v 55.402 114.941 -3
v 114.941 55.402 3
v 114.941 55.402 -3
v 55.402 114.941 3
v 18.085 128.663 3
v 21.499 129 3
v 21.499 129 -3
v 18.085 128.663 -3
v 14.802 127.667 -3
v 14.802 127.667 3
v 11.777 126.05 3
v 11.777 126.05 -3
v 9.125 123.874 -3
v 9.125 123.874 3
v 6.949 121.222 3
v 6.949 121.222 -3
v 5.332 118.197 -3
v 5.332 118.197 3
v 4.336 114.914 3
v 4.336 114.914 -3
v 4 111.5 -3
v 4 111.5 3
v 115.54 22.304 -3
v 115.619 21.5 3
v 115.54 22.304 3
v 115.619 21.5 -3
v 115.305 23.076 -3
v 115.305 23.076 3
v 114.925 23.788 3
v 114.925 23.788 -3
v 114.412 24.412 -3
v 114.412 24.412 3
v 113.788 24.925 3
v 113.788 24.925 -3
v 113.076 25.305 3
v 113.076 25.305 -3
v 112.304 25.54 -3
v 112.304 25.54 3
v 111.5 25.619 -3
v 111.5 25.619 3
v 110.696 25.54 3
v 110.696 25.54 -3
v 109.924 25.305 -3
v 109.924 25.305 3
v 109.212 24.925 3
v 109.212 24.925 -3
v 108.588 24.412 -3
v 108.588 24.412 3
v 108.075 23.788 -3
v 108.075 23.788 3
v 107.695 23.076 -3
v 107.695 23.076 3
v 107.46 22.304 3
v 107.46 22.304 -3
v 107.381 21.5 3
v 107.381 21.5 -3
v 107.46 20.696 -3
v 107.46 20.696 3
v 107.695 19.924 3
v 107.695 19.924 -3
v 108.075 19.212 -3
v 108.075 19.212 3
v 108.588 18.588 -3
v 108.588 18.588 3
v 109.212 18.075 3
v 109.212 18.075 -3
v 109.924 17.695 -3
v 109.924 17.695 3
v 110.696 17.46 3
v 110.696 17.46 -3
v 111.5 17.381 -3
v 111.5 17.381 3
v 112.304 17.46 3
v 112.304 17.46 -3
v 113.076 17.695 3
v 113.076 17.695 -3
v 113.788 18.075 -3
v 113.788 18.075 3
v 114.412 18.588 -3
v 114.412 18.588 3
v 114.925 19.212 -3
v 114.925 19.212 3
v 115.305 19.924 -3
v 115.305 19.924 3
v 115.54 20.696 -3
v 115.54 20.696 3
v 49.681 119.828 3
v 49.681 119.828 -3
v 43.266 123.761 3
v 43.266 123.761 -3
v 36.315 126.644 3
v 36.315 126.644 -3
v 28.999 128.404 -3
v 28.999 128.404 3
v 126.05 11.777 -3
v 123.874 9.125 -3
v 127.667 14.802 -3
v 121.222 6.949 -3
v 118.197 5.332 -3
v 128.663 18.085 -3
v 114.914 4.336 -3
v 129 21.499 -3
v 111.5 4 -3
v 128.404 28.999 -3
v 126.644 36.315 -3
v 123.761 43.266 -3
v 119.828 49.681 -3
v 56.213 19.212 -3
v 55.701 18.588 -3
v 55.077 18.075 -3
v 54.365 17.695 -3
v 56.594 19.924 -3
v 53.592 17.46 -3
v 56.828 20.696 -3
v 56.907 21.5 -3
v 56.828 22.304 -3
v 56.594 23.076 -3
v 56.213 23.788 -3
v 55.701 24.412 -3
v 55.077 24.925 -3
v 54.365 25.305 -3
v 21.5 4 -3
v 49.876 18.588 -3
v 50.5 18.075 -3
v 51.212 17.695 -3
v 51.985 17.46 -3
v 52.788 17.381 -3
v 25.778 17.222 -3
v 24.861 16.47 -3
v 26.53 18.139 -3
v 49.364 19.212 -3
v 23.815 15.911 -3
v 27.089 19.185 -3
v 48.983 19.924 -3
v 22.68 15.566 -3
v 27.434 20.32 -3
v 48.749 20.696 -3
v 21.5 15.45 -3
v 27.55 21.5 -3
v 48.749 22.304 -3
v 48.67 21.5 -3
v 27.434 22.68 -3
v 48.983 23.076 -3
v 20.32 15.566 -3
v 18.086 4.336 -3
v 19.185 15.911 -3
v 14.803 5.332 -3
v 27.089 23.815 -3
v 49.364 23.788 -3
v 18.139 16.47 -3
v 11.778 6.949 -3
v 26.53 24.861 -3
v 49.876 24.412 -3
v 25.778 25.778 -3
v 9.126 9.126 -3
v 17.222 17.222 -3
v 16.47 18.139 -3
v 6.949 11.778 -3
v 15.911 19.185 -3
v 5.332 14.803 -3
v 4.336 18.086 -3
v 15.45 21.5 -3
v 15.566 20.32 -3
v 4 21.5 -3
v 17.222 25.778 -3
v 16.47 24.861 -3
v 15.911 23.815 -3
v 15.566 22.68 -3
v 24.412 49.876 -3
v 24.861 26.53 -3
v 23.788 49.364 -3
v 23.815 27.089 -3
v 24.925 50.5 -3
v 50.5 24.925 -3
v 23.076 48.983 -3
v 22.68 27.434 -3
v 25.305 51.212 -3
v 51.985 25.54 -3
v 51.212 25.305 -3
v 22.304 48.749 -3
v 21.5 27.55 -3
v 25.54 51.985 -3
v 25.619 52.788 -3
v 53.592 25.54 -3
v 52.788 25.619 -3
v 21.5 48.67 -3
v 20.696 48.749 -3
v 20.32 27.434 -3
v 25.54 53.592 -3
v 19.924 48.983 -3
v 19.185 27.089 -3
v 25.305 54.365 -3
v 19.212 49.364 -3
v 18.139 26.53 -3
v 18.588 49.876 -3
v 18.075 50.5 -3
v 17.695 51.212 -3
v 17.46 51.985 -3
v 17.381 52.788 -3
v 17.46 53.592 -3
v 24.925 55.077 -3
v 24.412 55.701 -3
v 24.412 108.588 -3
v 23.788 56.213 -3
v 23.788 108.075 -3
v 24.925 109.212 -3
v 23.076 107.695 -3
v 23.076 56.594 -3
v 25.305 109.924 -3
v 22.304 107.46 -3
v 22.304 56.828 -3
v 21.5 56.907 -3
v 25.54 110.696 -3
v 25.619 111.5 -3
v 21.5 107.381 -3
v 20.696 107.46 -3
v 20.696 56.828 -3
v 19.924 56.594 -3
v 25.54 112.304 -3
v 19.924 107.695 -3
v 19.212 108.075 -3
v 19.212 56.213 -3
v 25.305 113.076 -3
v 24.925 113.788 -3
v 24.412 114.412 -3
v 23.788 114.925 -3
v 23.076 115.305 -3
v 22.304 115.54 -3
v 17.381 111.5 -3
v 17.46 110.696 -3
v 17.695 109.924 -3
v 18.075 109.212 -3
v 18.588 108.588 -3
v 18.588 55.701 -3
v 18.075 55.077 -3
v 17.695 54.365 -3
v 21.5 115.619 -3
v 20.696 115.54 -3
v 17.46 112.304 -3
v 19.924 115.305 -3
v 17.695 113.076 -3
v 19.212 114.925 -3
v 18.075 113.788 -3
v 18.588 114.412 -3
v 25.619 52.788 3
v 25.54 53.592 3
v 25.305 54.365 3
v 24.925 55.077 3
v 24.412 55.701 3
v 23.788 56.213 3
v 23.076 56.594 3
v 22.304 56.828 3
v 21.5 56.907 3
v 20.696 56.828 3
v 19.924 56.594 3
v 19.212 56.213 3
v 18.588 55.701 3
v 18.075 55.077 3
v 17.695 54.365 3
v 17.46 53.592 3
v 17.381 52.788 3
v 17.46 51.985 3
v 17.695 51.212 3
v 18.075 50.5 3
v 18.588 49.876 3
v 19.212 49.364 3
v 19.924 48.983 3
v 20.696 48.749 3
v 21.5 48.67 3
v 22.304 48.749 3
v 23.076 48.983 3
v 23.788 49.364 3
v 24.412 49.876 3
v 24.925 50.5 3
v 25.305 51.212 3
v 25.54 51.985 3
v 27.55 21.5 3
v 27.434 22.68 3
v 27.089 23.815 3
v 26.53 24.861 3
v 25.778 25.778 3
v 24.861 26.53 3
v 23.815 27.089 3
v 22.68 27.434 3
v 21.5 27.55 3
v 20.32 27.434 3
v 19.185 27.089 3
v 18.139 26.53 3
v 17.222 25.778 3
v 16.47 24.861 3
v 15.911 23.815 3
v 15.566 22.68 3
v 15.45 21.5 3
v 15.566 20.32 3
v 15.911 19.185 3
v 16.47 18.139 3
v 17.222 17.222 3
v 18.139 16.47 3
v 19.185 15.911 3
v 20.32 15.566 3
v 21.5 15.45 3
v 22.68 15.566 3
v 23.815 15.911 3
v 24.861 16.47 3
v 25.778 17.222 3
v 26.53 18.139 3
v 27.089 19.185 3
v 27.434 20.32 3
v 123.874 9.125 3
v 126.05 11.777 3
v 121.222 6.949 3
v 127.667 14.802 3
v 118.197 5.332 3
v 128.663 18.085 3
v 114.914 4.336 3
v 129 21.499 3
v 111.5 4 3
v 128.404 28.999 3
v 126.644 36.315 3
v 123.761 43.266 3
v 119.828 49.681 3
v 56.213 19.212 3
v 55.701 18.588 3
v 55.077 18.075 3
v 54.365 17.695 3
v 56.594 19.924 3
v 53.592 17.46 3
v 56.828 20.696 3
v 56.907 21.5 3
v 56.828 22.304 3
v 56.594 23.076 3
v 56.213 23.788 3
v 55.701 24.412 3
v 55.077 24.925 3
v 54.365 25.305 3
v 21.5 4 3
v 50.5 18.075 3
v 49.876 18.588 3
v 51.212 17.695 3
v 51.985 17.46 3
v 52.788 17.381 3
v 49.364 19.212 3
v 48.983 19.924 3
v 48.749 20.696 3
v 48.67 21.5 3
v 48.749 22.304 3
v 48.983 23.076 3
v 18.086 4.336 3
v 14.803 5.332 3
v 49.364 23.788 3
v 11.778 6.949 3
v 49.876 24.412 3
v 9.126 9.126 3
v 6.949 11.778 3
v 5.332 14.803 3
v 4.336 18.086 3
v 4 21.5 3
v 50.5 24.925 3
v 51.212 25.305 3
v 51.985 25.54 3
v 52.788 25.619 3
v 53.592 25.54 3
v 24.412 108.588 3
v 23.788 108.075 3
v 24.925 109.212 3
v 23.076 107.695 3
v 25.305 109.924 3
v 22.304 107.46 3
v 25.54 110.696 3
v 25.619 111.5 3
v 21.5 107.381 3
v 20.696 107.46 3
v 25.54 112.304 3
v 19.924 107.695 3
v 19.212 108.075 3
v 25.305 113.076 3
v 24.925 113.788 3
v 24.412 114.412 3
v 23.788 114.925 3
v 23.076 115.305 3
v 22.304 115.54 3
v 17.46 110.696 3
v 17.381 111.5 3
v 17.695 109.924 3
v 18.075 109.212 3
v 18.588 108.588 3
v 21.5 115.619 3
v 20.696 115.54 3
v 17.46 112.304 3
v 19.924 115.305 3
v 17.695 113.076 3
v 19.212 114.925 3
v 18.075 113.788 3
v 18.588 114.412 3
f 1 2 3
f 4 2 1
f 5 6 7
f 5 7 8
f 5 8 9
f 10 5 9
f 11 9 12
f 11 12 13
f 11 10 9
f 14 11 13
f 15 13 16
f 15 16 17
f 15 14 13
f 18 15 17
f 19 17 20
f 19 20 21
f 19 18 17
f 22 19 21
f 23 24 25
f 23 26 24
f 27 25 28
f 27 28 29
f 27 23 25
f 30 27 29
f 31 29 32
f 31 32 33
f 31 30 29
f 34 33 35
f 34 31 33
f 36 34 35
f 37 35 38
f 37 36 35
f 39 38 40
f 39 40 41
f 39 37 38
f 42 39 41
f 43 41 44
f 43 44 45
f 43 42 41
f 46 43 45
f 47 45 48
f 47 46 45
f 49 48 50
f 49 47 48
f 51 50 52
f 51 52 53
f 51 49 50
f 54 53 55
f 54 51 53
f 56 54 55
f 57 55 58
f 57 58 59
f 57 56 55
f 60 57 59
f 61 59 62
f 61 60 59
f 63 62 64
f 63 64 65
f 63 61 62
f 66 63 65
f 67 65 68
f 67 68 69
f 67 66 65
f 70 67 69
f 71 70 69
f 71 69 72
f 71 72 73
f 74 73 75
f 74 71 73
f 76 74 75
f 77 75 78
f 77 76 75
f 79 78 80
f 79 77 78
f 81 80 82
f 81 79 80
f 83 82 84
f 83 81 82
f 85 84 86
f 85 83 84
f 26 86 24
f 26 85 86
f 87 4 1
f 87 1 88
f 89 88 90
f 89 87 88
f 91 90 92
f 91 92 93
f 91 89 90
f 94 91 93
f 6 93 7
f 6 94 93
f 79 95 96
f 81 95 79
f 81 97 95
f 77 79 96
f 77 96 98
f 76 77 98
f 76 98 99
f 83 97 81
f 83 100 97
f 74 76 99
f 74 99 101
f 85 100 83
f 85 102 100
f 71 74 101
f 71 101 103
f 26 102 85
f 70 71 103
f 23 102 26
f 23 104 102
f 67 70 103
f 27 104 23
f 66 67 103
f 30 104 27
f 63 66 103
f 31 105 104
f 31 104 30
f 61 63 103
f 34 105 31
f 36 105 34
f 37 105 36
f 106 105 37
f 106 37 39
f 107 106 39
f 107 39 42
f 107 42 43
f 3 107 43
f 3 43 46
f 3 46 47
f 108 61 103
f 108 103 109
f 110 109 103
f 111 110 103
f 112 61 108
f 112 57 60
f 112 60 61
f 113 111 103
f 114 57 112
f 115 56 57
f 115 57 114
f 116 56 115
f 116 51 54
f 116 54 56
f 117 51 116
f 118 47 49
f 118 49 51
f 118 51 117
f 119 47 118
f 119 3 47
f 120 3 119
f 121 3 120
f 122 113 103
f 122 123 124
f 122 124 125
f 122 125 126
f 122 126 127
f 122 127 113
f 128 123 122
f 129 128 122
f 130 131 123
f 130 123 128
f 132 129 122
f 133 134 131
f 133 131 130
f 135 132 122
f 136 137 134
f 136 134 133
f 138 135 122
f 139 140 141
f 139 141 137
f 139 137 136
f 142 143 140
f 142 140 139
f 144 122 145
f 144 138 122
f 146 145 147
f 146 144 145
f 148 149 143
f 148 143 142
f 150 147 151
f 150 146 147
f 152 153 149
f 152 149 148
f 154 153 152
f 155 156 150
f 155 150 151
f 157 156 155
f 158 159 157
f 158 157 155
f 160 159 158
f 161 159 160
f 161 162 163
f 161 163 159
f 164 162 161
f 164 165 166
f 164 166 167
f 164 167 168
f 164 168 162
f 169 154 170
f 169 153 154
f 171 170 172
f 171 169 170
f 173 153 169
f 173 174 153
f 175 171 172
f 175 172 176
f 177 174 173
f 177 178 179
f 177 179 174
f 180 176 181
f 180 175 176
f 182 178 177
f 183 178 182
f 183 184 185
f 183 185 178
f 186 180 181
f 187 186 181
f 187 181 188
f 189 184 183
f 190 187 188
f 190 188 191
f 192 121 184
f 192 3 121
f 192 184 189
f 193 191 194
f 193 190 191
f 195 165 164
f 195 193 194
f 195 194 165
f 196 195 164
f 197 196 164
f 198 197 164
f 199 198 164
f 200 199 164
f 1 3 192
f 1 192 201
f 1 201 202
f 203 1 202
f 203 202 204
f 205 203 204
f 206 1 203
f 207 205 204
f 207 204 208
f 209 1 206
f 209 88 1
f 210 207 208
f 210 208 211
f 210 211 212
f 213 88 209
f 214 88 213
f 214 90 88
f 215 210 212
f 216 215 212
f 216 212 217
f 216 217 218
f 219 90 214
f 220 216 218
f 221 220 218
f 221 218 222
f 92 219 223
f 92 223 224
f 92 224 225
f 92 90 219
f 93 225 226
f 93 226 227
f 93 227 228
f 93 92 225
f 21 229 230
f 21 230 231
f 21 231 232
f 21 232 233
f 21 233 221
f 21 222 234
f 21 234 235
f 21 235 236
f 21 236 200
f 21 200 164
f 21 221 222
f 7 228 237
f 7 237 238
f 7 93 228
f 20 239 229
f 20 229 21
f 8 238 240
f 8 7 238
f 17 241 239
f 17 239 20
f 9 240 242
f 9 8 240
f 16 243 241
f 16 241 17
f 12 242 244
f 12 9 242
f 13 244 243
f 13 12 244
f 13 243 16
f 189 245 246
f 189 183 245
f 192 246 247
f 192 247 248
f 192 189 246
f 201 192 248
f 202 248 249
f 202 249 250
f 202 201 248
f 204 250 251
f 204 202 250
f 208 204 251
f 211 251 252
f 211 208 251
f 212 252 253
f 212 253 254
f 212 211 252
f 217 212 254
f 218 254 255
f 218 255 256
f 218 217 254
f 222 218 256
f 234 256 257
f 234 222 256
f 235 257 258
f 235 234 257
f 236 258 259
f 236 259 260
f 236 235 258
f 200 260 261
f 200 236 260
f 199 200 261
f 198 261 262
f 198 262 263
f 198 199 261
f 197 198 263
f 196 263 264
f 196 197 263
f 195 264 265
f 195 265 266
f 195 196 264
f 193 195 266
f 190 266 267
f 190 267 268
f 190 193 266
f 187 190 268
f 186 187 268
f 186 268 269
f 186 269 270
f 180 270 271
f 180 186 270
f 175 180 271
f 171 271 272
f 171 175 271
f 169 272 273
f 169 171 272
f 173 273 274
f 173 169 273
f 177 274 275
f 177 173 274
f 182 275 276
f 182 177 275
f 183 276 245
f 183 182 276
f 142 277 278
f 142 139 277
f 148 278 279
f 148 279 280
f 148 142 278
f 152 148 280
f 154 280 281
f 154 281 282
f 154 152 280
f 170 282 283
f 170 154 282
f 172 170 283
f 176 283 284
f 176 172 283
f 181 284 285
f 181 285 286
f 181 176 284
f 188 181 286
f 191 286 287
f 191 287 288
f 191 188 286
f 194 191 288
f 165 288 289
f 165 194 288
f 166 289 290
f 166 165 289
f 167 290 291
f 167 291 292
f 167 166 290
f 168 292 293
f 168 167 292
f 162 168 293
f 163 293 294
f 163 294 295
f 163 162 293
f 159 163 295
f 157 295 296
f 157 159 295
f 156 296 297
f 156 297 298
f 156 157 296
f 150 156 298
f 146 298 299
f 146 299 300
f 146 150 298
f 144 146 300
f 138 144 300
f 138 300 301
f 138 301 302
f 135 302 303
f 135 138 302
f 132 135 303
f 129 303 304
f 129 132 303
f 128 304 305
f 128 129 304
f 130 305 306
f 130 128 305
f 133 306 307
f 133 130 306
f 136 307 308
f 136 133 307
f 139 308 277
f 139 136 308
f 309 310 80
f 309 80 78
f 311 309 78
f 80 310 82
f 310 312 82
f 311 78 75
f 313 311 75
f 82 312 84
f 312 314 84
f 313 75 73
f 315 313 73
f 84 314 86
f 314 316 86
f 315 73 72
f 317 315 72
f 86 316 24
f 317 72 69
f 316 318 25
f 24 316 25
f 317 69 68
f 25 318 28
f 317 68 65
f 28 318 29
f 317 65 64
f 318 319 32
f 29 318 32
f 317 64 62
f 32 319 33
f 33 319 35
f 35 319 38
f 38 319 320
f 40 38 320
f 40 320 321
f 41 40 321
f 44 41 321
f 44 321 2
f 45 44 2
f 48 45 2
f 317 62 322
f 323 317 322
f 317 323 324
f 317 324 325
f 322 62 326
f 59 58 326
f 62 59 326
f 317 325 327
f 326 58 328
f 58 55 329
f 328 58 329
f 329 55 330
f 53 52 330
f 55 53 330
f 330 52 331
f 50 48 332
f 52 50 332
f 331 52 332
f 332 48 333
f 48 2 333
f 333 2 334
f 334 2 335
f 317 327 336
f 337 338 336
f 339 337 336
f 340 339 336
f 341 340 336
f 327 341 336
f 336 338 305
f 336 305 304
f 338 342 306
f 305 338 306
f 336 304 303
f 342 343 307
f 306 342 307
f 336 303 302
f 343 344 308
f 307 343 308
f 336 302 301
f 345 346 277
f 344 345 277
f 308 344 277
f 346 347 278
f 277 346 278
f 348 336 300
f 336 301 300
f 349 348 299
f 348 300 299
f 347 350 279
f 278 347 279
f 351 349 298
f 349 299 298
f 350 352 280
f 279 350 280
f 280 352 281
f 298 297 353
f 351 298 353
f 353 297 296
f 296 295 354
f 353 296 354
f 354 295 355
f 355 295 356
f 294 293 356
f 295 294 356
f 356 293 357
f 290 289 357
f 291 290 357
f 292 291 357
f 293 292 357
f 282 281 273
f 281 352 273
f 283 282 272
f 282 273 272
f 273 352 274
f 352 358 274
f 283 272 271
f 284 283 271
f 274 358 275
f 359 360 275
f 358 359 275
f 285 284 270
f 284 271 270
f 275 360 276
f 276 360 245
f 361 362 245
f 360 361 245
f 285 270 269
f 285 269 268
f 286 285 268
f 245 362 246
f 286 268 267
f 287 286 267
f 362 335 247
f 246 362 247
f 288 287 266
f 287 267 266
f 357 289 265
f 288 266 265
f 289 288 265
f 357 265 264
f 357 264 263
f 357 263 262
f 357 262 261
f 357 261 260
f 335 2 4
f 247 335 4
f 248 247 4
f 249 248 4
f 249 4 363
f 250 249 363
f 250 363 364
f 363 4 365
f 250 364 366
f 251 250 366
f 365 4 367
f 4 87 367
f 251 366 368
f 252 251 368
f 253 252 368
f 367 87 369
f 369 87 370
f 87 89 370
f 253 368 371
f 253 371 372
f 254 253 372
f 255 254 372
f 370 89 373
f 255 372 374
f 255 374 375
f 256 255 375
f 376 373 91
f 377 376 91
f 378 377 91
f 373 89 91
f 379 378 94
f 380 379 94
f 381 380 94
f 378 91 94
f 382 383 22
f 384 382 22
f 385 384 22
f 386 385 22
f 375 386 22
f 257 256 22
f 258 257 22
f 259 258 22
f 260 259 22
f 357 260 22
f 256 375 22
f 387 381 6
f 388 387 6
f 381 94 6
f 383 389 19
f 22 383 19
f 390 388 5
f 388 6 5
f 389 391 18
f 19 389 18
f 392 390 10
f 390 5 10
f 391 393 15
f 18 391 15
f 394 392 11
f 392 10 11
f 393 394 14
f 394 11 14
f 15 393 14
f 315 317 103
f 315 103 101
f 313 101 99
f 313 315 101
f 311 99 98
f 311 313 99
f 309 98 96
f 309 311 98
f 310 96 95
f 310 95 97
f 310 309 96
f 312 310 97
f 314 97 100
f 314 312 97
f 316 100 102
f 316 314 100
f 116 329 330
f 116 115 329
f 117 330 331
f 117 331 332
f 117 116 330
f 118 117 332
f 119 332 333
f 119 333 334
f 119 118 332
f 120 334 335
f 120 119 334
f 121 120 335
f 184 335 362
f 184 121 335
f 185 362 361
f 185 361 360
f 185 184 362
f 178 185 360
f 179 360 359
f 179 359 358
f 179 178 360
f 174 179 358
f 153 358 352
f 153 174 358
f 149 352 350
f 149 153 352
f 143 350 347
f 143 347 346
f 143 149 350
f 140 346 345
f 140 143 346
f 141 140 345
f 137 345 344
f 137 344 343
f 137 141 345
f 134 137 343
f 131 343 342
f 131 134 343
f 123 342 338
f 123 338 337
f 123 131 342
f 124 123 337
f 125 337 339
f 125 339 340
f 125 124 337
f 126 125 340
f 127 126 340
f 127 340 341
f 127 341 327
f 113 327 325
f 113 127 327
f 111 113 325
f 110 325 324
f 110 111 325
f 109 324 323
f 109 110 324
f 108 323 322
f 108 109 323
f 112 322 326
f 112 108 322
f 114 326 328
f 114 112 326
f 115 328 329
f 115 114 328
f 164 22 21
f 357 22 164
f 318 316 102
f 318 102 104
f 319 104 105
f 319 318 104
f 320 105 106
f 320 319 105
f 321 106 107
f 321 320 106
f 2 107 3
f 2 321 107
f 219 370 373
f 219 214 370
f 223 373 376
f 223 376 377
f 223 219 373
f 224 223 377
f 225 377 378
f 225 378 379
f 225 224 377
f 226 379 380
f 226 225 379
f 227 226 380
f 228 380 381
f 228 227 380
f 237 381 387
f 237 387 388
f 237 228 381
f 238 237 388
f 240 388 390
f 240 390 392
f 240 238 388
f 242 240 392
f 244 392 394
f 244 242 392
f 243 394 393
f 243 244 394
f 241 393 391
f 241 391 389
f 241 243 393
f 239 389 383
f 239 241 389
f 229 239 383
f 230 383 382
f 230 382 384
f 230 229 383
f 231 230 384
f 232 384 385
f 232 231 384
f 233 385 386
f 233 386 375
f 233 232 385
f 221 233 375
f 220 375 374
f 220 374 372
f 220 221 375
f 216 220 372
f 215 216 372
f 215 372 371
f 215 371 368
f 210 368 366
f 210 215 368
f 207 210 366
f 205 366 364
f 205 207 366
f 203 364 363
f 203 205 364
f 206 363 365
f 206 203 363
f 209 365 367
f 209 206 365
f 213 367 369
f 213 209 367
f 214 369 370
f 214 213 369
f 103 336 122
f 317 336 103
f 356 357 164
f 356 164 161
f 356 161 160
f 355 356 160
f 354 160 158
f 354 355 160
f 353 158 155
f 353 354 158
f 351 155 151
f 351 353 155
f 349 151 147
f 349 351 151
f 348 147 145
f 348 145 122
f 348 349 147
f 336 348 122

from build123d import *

# Parameters (mm, degrees)
SKETCH1_R           = 6.049999999999999
SKETCH1_R_2         = 4.118749999999998
SKETCH1_R_3         = 4.118750000000009
SKETCH1_R_4         = 4.118750000000003
SKETCH1_R_5         = 4.11875000000001
BOSS_EXTRUDE1_DEPTH = 3
FILLET1_R           = 21.5
FILLET2_R           = 52
CUT_EXTRUDE1_DEPTH  = 189.18607812481773


with BuildPart() as part:
    # Sketch1 → Boss-Extrude1 (new, symmetric)
    with BuildSketch(Plane.XY):
        Polygon((0, 0), (0, 133), (42.999999999999986, 133), (133, 42.99999999999999), (133, 9.06e-15), align=None)
        with Locations((21.5, 21.499999999999993)):
            Circle(SKETCH1_R, mode=Mode.SUBTRACT)
        with Locations((21.5, 111.50000000000001)):
            Circle(SKETCH1_R_2, mode=Mode.SUBTRACT)
        with Locations((111.50000000000001, 21.5)):
            Circle(SKETCH1_R_3, mode=Mode.SUBTRACT)
        with Locations((21.5, 52.78839999999999)):
            Circle(SKETCH1_R_4, mode=Mode.SUBTRACT)
        with Locations((52.788399999999996, 21.499999999999986)):
            Circle(SKETCH1_R_5, mode=Mode.SUBTRACT)
    extrude(amount=BOSS_EXTRUDE1_DEPTH, both=True)

    # Fillet1
    fillet1_edges = [part.edges().sort_by_distance(p)[0] for p in [
        (0, 0, 0),
        (0, 133, 0),
        (133, 9.06e-15, 0),
    ]]
    fillet(fillet1_edges, radius=FILLET1_R)

    # Fillet2
    # the kernel refuses this fillet: 52 mm, written as the material it takes off along each edge
    with BuildSketch(Plane(origin=(133, 43, -56.84767436170304), x_dir=(-0.7071067811865476, 0.7071067811865476, 0), z_dir=(0, 0, 1))) as fillet2_piece_1:
        with BuildLine():
            CenterArc((21.539069744681207, 52.00000000000001), FILLET2_R, 225.07350833515432, 44.926491664845685)
            Line((-15.183278672480162, 15.183303696167892), (-18.855513514196304, 11.501634065784673))
            ThreePointArc((-18.855513514196304, 11.501634065784673), (-18.87975105768081, 11.52584053334073), (-3.6769552621700394, -3.6769552621700394))
            Line((-3.6769552621700394, -3.6769552621700394), (-4.9e-15, -5.200000000000005))
            Line((-4.9e-15, -5.200000000000005), (21.539069744681218, -5.199999999999996))
            Line((21.539069744681218, -5.199999999999996), (21.539069744681214, 4.7e-16))
        make_face()
    extrude(amount=113.69534872340608, mode=Mode.SUBTRACT)
    with BuildSketch(Plane(origin=(42.999999999999986, 133, 56.847674361702985), x_dir=(-0.9999999999996605, -8.240534738615283e-07, 0), z_dir=(0, 0, -1))) as fillet2_piece_2:
        with BuildLine():
            CenterArc((21.539173195539043, -51.9999571492017), FILLET2_R, 90.07355554994047, 44.926491664845685)
            Line((-15.230409726226513, -15.230434827591285), (-18.90736801840307, -11.55348259543025))
            Line((-18.90736801840307, -11.55348259543025), (-3.676958292176556, 3.6769522321610486))
            Line((-3.676958292176556, 3.6769522321610486), (-4.28507806408e-06, 5.199999999998223))
            ThreePointArc((-4.28507806408e-06, 5.199999999998223), (21.499995714914625, 5.200017717147912), (21.46574062621809, 5.1999957149201785))
            Line((21.46574062621809, 5.1999957149201785), (21.472416314338172, 0))
        make_face()
    extrude(amount=113.69534872340597, mode=Mode.SUBTRACT)

    # Sketch2 → Cut-Extrude1 (cut, through all)
    with BuildSketch(Plane.XY.offset(3)):
        with BuildLine():
            Line((117.76956733680983, 58.23043266319015), (58.23043266319017, 117.76956733680981))
            ThreePointArc((58.23043266319017, 117.76956733680981), (41.3784881824358, 129.03426172642116), (21.499999999999996, 133))
            ThreePointArc((21.499999999999996, 133), (6.2972042044892405, 126.70279579551078), (3.47e-15, 111.50000000000001))
            Line((3.47e-15, 111.50000000000001), (0, 21.5))
            ThreePointArc((0, 21.5), (6.297204204489223, 6.297204204489235), (21.49999999999999, 3.47e-15))
            Line((21.49999999999999, 3.47e-15), (111.50000000000001, 1.041e-14))
            ThreePointArc((111.50000000000001, 1.041e-14), (126.70279579551078, 6.297204204489239), (133, 21.500000000000007))
            ThreePointArc((133, 21.500000000000007), (129.03426172642114, 41.37848818243579), (117.76956733680983, 58.23043266319015))
        make_face()
        with BuildLine():
            Line((114.94114021206362, 55.40200553844396), (55.402005538443966, 114.94114021206363))
            ThreePointArc((55.402005538443966, 114.94114021206363), (39.84708125964561, 125.33902242576387), (21.49854269401705, 128.9999999393217))
            ThreePointArc((21.49854269401705, 128.9999999393217), (9.12511610449009, 123.87385342456624), (4.0000000000000036, 111.50000000000001))
            Line((4.0000000000000036, 111.50000000000001), (4, 21.500000000000004))
            ThreePointArc((4, 21.500000000000004), (9.125631329235414, 9.125631329235425), (21.499999999999996, 4.0000000000000036))
            Line((21.499999999999996, 4.0000000000000036), (111.50000000000001, 4.000000000000011))
            ThreePointArc((111.50000000000001, 4.000000000000011), (123.8738534245646, 9.125116104488455), (128.9999999393217, 21.49854269401244))
            ThreePointArc((128.9999999393217, 21.49854269401244), (125.33902242576474, 39.847081259643474), (114.94114021206362, 55.40200553844396))
        make_face(mode=Mode.SUBTRACT)
    extrude(amount=-CUT_EXTRUDE1_DEPTH, mode=Mode.SUBTRACT)


with BuildPart() as cut_extrude1_kept_piece:
    # of the separate pieces the step leaves, the one the design keeps (cut_extrude1_pieces_kept)
    add(part.part.solids().sort_by_distance((128.999999939, 21.498542694, -3))[0])


solid = cut_extrude1_kept_piece.part
